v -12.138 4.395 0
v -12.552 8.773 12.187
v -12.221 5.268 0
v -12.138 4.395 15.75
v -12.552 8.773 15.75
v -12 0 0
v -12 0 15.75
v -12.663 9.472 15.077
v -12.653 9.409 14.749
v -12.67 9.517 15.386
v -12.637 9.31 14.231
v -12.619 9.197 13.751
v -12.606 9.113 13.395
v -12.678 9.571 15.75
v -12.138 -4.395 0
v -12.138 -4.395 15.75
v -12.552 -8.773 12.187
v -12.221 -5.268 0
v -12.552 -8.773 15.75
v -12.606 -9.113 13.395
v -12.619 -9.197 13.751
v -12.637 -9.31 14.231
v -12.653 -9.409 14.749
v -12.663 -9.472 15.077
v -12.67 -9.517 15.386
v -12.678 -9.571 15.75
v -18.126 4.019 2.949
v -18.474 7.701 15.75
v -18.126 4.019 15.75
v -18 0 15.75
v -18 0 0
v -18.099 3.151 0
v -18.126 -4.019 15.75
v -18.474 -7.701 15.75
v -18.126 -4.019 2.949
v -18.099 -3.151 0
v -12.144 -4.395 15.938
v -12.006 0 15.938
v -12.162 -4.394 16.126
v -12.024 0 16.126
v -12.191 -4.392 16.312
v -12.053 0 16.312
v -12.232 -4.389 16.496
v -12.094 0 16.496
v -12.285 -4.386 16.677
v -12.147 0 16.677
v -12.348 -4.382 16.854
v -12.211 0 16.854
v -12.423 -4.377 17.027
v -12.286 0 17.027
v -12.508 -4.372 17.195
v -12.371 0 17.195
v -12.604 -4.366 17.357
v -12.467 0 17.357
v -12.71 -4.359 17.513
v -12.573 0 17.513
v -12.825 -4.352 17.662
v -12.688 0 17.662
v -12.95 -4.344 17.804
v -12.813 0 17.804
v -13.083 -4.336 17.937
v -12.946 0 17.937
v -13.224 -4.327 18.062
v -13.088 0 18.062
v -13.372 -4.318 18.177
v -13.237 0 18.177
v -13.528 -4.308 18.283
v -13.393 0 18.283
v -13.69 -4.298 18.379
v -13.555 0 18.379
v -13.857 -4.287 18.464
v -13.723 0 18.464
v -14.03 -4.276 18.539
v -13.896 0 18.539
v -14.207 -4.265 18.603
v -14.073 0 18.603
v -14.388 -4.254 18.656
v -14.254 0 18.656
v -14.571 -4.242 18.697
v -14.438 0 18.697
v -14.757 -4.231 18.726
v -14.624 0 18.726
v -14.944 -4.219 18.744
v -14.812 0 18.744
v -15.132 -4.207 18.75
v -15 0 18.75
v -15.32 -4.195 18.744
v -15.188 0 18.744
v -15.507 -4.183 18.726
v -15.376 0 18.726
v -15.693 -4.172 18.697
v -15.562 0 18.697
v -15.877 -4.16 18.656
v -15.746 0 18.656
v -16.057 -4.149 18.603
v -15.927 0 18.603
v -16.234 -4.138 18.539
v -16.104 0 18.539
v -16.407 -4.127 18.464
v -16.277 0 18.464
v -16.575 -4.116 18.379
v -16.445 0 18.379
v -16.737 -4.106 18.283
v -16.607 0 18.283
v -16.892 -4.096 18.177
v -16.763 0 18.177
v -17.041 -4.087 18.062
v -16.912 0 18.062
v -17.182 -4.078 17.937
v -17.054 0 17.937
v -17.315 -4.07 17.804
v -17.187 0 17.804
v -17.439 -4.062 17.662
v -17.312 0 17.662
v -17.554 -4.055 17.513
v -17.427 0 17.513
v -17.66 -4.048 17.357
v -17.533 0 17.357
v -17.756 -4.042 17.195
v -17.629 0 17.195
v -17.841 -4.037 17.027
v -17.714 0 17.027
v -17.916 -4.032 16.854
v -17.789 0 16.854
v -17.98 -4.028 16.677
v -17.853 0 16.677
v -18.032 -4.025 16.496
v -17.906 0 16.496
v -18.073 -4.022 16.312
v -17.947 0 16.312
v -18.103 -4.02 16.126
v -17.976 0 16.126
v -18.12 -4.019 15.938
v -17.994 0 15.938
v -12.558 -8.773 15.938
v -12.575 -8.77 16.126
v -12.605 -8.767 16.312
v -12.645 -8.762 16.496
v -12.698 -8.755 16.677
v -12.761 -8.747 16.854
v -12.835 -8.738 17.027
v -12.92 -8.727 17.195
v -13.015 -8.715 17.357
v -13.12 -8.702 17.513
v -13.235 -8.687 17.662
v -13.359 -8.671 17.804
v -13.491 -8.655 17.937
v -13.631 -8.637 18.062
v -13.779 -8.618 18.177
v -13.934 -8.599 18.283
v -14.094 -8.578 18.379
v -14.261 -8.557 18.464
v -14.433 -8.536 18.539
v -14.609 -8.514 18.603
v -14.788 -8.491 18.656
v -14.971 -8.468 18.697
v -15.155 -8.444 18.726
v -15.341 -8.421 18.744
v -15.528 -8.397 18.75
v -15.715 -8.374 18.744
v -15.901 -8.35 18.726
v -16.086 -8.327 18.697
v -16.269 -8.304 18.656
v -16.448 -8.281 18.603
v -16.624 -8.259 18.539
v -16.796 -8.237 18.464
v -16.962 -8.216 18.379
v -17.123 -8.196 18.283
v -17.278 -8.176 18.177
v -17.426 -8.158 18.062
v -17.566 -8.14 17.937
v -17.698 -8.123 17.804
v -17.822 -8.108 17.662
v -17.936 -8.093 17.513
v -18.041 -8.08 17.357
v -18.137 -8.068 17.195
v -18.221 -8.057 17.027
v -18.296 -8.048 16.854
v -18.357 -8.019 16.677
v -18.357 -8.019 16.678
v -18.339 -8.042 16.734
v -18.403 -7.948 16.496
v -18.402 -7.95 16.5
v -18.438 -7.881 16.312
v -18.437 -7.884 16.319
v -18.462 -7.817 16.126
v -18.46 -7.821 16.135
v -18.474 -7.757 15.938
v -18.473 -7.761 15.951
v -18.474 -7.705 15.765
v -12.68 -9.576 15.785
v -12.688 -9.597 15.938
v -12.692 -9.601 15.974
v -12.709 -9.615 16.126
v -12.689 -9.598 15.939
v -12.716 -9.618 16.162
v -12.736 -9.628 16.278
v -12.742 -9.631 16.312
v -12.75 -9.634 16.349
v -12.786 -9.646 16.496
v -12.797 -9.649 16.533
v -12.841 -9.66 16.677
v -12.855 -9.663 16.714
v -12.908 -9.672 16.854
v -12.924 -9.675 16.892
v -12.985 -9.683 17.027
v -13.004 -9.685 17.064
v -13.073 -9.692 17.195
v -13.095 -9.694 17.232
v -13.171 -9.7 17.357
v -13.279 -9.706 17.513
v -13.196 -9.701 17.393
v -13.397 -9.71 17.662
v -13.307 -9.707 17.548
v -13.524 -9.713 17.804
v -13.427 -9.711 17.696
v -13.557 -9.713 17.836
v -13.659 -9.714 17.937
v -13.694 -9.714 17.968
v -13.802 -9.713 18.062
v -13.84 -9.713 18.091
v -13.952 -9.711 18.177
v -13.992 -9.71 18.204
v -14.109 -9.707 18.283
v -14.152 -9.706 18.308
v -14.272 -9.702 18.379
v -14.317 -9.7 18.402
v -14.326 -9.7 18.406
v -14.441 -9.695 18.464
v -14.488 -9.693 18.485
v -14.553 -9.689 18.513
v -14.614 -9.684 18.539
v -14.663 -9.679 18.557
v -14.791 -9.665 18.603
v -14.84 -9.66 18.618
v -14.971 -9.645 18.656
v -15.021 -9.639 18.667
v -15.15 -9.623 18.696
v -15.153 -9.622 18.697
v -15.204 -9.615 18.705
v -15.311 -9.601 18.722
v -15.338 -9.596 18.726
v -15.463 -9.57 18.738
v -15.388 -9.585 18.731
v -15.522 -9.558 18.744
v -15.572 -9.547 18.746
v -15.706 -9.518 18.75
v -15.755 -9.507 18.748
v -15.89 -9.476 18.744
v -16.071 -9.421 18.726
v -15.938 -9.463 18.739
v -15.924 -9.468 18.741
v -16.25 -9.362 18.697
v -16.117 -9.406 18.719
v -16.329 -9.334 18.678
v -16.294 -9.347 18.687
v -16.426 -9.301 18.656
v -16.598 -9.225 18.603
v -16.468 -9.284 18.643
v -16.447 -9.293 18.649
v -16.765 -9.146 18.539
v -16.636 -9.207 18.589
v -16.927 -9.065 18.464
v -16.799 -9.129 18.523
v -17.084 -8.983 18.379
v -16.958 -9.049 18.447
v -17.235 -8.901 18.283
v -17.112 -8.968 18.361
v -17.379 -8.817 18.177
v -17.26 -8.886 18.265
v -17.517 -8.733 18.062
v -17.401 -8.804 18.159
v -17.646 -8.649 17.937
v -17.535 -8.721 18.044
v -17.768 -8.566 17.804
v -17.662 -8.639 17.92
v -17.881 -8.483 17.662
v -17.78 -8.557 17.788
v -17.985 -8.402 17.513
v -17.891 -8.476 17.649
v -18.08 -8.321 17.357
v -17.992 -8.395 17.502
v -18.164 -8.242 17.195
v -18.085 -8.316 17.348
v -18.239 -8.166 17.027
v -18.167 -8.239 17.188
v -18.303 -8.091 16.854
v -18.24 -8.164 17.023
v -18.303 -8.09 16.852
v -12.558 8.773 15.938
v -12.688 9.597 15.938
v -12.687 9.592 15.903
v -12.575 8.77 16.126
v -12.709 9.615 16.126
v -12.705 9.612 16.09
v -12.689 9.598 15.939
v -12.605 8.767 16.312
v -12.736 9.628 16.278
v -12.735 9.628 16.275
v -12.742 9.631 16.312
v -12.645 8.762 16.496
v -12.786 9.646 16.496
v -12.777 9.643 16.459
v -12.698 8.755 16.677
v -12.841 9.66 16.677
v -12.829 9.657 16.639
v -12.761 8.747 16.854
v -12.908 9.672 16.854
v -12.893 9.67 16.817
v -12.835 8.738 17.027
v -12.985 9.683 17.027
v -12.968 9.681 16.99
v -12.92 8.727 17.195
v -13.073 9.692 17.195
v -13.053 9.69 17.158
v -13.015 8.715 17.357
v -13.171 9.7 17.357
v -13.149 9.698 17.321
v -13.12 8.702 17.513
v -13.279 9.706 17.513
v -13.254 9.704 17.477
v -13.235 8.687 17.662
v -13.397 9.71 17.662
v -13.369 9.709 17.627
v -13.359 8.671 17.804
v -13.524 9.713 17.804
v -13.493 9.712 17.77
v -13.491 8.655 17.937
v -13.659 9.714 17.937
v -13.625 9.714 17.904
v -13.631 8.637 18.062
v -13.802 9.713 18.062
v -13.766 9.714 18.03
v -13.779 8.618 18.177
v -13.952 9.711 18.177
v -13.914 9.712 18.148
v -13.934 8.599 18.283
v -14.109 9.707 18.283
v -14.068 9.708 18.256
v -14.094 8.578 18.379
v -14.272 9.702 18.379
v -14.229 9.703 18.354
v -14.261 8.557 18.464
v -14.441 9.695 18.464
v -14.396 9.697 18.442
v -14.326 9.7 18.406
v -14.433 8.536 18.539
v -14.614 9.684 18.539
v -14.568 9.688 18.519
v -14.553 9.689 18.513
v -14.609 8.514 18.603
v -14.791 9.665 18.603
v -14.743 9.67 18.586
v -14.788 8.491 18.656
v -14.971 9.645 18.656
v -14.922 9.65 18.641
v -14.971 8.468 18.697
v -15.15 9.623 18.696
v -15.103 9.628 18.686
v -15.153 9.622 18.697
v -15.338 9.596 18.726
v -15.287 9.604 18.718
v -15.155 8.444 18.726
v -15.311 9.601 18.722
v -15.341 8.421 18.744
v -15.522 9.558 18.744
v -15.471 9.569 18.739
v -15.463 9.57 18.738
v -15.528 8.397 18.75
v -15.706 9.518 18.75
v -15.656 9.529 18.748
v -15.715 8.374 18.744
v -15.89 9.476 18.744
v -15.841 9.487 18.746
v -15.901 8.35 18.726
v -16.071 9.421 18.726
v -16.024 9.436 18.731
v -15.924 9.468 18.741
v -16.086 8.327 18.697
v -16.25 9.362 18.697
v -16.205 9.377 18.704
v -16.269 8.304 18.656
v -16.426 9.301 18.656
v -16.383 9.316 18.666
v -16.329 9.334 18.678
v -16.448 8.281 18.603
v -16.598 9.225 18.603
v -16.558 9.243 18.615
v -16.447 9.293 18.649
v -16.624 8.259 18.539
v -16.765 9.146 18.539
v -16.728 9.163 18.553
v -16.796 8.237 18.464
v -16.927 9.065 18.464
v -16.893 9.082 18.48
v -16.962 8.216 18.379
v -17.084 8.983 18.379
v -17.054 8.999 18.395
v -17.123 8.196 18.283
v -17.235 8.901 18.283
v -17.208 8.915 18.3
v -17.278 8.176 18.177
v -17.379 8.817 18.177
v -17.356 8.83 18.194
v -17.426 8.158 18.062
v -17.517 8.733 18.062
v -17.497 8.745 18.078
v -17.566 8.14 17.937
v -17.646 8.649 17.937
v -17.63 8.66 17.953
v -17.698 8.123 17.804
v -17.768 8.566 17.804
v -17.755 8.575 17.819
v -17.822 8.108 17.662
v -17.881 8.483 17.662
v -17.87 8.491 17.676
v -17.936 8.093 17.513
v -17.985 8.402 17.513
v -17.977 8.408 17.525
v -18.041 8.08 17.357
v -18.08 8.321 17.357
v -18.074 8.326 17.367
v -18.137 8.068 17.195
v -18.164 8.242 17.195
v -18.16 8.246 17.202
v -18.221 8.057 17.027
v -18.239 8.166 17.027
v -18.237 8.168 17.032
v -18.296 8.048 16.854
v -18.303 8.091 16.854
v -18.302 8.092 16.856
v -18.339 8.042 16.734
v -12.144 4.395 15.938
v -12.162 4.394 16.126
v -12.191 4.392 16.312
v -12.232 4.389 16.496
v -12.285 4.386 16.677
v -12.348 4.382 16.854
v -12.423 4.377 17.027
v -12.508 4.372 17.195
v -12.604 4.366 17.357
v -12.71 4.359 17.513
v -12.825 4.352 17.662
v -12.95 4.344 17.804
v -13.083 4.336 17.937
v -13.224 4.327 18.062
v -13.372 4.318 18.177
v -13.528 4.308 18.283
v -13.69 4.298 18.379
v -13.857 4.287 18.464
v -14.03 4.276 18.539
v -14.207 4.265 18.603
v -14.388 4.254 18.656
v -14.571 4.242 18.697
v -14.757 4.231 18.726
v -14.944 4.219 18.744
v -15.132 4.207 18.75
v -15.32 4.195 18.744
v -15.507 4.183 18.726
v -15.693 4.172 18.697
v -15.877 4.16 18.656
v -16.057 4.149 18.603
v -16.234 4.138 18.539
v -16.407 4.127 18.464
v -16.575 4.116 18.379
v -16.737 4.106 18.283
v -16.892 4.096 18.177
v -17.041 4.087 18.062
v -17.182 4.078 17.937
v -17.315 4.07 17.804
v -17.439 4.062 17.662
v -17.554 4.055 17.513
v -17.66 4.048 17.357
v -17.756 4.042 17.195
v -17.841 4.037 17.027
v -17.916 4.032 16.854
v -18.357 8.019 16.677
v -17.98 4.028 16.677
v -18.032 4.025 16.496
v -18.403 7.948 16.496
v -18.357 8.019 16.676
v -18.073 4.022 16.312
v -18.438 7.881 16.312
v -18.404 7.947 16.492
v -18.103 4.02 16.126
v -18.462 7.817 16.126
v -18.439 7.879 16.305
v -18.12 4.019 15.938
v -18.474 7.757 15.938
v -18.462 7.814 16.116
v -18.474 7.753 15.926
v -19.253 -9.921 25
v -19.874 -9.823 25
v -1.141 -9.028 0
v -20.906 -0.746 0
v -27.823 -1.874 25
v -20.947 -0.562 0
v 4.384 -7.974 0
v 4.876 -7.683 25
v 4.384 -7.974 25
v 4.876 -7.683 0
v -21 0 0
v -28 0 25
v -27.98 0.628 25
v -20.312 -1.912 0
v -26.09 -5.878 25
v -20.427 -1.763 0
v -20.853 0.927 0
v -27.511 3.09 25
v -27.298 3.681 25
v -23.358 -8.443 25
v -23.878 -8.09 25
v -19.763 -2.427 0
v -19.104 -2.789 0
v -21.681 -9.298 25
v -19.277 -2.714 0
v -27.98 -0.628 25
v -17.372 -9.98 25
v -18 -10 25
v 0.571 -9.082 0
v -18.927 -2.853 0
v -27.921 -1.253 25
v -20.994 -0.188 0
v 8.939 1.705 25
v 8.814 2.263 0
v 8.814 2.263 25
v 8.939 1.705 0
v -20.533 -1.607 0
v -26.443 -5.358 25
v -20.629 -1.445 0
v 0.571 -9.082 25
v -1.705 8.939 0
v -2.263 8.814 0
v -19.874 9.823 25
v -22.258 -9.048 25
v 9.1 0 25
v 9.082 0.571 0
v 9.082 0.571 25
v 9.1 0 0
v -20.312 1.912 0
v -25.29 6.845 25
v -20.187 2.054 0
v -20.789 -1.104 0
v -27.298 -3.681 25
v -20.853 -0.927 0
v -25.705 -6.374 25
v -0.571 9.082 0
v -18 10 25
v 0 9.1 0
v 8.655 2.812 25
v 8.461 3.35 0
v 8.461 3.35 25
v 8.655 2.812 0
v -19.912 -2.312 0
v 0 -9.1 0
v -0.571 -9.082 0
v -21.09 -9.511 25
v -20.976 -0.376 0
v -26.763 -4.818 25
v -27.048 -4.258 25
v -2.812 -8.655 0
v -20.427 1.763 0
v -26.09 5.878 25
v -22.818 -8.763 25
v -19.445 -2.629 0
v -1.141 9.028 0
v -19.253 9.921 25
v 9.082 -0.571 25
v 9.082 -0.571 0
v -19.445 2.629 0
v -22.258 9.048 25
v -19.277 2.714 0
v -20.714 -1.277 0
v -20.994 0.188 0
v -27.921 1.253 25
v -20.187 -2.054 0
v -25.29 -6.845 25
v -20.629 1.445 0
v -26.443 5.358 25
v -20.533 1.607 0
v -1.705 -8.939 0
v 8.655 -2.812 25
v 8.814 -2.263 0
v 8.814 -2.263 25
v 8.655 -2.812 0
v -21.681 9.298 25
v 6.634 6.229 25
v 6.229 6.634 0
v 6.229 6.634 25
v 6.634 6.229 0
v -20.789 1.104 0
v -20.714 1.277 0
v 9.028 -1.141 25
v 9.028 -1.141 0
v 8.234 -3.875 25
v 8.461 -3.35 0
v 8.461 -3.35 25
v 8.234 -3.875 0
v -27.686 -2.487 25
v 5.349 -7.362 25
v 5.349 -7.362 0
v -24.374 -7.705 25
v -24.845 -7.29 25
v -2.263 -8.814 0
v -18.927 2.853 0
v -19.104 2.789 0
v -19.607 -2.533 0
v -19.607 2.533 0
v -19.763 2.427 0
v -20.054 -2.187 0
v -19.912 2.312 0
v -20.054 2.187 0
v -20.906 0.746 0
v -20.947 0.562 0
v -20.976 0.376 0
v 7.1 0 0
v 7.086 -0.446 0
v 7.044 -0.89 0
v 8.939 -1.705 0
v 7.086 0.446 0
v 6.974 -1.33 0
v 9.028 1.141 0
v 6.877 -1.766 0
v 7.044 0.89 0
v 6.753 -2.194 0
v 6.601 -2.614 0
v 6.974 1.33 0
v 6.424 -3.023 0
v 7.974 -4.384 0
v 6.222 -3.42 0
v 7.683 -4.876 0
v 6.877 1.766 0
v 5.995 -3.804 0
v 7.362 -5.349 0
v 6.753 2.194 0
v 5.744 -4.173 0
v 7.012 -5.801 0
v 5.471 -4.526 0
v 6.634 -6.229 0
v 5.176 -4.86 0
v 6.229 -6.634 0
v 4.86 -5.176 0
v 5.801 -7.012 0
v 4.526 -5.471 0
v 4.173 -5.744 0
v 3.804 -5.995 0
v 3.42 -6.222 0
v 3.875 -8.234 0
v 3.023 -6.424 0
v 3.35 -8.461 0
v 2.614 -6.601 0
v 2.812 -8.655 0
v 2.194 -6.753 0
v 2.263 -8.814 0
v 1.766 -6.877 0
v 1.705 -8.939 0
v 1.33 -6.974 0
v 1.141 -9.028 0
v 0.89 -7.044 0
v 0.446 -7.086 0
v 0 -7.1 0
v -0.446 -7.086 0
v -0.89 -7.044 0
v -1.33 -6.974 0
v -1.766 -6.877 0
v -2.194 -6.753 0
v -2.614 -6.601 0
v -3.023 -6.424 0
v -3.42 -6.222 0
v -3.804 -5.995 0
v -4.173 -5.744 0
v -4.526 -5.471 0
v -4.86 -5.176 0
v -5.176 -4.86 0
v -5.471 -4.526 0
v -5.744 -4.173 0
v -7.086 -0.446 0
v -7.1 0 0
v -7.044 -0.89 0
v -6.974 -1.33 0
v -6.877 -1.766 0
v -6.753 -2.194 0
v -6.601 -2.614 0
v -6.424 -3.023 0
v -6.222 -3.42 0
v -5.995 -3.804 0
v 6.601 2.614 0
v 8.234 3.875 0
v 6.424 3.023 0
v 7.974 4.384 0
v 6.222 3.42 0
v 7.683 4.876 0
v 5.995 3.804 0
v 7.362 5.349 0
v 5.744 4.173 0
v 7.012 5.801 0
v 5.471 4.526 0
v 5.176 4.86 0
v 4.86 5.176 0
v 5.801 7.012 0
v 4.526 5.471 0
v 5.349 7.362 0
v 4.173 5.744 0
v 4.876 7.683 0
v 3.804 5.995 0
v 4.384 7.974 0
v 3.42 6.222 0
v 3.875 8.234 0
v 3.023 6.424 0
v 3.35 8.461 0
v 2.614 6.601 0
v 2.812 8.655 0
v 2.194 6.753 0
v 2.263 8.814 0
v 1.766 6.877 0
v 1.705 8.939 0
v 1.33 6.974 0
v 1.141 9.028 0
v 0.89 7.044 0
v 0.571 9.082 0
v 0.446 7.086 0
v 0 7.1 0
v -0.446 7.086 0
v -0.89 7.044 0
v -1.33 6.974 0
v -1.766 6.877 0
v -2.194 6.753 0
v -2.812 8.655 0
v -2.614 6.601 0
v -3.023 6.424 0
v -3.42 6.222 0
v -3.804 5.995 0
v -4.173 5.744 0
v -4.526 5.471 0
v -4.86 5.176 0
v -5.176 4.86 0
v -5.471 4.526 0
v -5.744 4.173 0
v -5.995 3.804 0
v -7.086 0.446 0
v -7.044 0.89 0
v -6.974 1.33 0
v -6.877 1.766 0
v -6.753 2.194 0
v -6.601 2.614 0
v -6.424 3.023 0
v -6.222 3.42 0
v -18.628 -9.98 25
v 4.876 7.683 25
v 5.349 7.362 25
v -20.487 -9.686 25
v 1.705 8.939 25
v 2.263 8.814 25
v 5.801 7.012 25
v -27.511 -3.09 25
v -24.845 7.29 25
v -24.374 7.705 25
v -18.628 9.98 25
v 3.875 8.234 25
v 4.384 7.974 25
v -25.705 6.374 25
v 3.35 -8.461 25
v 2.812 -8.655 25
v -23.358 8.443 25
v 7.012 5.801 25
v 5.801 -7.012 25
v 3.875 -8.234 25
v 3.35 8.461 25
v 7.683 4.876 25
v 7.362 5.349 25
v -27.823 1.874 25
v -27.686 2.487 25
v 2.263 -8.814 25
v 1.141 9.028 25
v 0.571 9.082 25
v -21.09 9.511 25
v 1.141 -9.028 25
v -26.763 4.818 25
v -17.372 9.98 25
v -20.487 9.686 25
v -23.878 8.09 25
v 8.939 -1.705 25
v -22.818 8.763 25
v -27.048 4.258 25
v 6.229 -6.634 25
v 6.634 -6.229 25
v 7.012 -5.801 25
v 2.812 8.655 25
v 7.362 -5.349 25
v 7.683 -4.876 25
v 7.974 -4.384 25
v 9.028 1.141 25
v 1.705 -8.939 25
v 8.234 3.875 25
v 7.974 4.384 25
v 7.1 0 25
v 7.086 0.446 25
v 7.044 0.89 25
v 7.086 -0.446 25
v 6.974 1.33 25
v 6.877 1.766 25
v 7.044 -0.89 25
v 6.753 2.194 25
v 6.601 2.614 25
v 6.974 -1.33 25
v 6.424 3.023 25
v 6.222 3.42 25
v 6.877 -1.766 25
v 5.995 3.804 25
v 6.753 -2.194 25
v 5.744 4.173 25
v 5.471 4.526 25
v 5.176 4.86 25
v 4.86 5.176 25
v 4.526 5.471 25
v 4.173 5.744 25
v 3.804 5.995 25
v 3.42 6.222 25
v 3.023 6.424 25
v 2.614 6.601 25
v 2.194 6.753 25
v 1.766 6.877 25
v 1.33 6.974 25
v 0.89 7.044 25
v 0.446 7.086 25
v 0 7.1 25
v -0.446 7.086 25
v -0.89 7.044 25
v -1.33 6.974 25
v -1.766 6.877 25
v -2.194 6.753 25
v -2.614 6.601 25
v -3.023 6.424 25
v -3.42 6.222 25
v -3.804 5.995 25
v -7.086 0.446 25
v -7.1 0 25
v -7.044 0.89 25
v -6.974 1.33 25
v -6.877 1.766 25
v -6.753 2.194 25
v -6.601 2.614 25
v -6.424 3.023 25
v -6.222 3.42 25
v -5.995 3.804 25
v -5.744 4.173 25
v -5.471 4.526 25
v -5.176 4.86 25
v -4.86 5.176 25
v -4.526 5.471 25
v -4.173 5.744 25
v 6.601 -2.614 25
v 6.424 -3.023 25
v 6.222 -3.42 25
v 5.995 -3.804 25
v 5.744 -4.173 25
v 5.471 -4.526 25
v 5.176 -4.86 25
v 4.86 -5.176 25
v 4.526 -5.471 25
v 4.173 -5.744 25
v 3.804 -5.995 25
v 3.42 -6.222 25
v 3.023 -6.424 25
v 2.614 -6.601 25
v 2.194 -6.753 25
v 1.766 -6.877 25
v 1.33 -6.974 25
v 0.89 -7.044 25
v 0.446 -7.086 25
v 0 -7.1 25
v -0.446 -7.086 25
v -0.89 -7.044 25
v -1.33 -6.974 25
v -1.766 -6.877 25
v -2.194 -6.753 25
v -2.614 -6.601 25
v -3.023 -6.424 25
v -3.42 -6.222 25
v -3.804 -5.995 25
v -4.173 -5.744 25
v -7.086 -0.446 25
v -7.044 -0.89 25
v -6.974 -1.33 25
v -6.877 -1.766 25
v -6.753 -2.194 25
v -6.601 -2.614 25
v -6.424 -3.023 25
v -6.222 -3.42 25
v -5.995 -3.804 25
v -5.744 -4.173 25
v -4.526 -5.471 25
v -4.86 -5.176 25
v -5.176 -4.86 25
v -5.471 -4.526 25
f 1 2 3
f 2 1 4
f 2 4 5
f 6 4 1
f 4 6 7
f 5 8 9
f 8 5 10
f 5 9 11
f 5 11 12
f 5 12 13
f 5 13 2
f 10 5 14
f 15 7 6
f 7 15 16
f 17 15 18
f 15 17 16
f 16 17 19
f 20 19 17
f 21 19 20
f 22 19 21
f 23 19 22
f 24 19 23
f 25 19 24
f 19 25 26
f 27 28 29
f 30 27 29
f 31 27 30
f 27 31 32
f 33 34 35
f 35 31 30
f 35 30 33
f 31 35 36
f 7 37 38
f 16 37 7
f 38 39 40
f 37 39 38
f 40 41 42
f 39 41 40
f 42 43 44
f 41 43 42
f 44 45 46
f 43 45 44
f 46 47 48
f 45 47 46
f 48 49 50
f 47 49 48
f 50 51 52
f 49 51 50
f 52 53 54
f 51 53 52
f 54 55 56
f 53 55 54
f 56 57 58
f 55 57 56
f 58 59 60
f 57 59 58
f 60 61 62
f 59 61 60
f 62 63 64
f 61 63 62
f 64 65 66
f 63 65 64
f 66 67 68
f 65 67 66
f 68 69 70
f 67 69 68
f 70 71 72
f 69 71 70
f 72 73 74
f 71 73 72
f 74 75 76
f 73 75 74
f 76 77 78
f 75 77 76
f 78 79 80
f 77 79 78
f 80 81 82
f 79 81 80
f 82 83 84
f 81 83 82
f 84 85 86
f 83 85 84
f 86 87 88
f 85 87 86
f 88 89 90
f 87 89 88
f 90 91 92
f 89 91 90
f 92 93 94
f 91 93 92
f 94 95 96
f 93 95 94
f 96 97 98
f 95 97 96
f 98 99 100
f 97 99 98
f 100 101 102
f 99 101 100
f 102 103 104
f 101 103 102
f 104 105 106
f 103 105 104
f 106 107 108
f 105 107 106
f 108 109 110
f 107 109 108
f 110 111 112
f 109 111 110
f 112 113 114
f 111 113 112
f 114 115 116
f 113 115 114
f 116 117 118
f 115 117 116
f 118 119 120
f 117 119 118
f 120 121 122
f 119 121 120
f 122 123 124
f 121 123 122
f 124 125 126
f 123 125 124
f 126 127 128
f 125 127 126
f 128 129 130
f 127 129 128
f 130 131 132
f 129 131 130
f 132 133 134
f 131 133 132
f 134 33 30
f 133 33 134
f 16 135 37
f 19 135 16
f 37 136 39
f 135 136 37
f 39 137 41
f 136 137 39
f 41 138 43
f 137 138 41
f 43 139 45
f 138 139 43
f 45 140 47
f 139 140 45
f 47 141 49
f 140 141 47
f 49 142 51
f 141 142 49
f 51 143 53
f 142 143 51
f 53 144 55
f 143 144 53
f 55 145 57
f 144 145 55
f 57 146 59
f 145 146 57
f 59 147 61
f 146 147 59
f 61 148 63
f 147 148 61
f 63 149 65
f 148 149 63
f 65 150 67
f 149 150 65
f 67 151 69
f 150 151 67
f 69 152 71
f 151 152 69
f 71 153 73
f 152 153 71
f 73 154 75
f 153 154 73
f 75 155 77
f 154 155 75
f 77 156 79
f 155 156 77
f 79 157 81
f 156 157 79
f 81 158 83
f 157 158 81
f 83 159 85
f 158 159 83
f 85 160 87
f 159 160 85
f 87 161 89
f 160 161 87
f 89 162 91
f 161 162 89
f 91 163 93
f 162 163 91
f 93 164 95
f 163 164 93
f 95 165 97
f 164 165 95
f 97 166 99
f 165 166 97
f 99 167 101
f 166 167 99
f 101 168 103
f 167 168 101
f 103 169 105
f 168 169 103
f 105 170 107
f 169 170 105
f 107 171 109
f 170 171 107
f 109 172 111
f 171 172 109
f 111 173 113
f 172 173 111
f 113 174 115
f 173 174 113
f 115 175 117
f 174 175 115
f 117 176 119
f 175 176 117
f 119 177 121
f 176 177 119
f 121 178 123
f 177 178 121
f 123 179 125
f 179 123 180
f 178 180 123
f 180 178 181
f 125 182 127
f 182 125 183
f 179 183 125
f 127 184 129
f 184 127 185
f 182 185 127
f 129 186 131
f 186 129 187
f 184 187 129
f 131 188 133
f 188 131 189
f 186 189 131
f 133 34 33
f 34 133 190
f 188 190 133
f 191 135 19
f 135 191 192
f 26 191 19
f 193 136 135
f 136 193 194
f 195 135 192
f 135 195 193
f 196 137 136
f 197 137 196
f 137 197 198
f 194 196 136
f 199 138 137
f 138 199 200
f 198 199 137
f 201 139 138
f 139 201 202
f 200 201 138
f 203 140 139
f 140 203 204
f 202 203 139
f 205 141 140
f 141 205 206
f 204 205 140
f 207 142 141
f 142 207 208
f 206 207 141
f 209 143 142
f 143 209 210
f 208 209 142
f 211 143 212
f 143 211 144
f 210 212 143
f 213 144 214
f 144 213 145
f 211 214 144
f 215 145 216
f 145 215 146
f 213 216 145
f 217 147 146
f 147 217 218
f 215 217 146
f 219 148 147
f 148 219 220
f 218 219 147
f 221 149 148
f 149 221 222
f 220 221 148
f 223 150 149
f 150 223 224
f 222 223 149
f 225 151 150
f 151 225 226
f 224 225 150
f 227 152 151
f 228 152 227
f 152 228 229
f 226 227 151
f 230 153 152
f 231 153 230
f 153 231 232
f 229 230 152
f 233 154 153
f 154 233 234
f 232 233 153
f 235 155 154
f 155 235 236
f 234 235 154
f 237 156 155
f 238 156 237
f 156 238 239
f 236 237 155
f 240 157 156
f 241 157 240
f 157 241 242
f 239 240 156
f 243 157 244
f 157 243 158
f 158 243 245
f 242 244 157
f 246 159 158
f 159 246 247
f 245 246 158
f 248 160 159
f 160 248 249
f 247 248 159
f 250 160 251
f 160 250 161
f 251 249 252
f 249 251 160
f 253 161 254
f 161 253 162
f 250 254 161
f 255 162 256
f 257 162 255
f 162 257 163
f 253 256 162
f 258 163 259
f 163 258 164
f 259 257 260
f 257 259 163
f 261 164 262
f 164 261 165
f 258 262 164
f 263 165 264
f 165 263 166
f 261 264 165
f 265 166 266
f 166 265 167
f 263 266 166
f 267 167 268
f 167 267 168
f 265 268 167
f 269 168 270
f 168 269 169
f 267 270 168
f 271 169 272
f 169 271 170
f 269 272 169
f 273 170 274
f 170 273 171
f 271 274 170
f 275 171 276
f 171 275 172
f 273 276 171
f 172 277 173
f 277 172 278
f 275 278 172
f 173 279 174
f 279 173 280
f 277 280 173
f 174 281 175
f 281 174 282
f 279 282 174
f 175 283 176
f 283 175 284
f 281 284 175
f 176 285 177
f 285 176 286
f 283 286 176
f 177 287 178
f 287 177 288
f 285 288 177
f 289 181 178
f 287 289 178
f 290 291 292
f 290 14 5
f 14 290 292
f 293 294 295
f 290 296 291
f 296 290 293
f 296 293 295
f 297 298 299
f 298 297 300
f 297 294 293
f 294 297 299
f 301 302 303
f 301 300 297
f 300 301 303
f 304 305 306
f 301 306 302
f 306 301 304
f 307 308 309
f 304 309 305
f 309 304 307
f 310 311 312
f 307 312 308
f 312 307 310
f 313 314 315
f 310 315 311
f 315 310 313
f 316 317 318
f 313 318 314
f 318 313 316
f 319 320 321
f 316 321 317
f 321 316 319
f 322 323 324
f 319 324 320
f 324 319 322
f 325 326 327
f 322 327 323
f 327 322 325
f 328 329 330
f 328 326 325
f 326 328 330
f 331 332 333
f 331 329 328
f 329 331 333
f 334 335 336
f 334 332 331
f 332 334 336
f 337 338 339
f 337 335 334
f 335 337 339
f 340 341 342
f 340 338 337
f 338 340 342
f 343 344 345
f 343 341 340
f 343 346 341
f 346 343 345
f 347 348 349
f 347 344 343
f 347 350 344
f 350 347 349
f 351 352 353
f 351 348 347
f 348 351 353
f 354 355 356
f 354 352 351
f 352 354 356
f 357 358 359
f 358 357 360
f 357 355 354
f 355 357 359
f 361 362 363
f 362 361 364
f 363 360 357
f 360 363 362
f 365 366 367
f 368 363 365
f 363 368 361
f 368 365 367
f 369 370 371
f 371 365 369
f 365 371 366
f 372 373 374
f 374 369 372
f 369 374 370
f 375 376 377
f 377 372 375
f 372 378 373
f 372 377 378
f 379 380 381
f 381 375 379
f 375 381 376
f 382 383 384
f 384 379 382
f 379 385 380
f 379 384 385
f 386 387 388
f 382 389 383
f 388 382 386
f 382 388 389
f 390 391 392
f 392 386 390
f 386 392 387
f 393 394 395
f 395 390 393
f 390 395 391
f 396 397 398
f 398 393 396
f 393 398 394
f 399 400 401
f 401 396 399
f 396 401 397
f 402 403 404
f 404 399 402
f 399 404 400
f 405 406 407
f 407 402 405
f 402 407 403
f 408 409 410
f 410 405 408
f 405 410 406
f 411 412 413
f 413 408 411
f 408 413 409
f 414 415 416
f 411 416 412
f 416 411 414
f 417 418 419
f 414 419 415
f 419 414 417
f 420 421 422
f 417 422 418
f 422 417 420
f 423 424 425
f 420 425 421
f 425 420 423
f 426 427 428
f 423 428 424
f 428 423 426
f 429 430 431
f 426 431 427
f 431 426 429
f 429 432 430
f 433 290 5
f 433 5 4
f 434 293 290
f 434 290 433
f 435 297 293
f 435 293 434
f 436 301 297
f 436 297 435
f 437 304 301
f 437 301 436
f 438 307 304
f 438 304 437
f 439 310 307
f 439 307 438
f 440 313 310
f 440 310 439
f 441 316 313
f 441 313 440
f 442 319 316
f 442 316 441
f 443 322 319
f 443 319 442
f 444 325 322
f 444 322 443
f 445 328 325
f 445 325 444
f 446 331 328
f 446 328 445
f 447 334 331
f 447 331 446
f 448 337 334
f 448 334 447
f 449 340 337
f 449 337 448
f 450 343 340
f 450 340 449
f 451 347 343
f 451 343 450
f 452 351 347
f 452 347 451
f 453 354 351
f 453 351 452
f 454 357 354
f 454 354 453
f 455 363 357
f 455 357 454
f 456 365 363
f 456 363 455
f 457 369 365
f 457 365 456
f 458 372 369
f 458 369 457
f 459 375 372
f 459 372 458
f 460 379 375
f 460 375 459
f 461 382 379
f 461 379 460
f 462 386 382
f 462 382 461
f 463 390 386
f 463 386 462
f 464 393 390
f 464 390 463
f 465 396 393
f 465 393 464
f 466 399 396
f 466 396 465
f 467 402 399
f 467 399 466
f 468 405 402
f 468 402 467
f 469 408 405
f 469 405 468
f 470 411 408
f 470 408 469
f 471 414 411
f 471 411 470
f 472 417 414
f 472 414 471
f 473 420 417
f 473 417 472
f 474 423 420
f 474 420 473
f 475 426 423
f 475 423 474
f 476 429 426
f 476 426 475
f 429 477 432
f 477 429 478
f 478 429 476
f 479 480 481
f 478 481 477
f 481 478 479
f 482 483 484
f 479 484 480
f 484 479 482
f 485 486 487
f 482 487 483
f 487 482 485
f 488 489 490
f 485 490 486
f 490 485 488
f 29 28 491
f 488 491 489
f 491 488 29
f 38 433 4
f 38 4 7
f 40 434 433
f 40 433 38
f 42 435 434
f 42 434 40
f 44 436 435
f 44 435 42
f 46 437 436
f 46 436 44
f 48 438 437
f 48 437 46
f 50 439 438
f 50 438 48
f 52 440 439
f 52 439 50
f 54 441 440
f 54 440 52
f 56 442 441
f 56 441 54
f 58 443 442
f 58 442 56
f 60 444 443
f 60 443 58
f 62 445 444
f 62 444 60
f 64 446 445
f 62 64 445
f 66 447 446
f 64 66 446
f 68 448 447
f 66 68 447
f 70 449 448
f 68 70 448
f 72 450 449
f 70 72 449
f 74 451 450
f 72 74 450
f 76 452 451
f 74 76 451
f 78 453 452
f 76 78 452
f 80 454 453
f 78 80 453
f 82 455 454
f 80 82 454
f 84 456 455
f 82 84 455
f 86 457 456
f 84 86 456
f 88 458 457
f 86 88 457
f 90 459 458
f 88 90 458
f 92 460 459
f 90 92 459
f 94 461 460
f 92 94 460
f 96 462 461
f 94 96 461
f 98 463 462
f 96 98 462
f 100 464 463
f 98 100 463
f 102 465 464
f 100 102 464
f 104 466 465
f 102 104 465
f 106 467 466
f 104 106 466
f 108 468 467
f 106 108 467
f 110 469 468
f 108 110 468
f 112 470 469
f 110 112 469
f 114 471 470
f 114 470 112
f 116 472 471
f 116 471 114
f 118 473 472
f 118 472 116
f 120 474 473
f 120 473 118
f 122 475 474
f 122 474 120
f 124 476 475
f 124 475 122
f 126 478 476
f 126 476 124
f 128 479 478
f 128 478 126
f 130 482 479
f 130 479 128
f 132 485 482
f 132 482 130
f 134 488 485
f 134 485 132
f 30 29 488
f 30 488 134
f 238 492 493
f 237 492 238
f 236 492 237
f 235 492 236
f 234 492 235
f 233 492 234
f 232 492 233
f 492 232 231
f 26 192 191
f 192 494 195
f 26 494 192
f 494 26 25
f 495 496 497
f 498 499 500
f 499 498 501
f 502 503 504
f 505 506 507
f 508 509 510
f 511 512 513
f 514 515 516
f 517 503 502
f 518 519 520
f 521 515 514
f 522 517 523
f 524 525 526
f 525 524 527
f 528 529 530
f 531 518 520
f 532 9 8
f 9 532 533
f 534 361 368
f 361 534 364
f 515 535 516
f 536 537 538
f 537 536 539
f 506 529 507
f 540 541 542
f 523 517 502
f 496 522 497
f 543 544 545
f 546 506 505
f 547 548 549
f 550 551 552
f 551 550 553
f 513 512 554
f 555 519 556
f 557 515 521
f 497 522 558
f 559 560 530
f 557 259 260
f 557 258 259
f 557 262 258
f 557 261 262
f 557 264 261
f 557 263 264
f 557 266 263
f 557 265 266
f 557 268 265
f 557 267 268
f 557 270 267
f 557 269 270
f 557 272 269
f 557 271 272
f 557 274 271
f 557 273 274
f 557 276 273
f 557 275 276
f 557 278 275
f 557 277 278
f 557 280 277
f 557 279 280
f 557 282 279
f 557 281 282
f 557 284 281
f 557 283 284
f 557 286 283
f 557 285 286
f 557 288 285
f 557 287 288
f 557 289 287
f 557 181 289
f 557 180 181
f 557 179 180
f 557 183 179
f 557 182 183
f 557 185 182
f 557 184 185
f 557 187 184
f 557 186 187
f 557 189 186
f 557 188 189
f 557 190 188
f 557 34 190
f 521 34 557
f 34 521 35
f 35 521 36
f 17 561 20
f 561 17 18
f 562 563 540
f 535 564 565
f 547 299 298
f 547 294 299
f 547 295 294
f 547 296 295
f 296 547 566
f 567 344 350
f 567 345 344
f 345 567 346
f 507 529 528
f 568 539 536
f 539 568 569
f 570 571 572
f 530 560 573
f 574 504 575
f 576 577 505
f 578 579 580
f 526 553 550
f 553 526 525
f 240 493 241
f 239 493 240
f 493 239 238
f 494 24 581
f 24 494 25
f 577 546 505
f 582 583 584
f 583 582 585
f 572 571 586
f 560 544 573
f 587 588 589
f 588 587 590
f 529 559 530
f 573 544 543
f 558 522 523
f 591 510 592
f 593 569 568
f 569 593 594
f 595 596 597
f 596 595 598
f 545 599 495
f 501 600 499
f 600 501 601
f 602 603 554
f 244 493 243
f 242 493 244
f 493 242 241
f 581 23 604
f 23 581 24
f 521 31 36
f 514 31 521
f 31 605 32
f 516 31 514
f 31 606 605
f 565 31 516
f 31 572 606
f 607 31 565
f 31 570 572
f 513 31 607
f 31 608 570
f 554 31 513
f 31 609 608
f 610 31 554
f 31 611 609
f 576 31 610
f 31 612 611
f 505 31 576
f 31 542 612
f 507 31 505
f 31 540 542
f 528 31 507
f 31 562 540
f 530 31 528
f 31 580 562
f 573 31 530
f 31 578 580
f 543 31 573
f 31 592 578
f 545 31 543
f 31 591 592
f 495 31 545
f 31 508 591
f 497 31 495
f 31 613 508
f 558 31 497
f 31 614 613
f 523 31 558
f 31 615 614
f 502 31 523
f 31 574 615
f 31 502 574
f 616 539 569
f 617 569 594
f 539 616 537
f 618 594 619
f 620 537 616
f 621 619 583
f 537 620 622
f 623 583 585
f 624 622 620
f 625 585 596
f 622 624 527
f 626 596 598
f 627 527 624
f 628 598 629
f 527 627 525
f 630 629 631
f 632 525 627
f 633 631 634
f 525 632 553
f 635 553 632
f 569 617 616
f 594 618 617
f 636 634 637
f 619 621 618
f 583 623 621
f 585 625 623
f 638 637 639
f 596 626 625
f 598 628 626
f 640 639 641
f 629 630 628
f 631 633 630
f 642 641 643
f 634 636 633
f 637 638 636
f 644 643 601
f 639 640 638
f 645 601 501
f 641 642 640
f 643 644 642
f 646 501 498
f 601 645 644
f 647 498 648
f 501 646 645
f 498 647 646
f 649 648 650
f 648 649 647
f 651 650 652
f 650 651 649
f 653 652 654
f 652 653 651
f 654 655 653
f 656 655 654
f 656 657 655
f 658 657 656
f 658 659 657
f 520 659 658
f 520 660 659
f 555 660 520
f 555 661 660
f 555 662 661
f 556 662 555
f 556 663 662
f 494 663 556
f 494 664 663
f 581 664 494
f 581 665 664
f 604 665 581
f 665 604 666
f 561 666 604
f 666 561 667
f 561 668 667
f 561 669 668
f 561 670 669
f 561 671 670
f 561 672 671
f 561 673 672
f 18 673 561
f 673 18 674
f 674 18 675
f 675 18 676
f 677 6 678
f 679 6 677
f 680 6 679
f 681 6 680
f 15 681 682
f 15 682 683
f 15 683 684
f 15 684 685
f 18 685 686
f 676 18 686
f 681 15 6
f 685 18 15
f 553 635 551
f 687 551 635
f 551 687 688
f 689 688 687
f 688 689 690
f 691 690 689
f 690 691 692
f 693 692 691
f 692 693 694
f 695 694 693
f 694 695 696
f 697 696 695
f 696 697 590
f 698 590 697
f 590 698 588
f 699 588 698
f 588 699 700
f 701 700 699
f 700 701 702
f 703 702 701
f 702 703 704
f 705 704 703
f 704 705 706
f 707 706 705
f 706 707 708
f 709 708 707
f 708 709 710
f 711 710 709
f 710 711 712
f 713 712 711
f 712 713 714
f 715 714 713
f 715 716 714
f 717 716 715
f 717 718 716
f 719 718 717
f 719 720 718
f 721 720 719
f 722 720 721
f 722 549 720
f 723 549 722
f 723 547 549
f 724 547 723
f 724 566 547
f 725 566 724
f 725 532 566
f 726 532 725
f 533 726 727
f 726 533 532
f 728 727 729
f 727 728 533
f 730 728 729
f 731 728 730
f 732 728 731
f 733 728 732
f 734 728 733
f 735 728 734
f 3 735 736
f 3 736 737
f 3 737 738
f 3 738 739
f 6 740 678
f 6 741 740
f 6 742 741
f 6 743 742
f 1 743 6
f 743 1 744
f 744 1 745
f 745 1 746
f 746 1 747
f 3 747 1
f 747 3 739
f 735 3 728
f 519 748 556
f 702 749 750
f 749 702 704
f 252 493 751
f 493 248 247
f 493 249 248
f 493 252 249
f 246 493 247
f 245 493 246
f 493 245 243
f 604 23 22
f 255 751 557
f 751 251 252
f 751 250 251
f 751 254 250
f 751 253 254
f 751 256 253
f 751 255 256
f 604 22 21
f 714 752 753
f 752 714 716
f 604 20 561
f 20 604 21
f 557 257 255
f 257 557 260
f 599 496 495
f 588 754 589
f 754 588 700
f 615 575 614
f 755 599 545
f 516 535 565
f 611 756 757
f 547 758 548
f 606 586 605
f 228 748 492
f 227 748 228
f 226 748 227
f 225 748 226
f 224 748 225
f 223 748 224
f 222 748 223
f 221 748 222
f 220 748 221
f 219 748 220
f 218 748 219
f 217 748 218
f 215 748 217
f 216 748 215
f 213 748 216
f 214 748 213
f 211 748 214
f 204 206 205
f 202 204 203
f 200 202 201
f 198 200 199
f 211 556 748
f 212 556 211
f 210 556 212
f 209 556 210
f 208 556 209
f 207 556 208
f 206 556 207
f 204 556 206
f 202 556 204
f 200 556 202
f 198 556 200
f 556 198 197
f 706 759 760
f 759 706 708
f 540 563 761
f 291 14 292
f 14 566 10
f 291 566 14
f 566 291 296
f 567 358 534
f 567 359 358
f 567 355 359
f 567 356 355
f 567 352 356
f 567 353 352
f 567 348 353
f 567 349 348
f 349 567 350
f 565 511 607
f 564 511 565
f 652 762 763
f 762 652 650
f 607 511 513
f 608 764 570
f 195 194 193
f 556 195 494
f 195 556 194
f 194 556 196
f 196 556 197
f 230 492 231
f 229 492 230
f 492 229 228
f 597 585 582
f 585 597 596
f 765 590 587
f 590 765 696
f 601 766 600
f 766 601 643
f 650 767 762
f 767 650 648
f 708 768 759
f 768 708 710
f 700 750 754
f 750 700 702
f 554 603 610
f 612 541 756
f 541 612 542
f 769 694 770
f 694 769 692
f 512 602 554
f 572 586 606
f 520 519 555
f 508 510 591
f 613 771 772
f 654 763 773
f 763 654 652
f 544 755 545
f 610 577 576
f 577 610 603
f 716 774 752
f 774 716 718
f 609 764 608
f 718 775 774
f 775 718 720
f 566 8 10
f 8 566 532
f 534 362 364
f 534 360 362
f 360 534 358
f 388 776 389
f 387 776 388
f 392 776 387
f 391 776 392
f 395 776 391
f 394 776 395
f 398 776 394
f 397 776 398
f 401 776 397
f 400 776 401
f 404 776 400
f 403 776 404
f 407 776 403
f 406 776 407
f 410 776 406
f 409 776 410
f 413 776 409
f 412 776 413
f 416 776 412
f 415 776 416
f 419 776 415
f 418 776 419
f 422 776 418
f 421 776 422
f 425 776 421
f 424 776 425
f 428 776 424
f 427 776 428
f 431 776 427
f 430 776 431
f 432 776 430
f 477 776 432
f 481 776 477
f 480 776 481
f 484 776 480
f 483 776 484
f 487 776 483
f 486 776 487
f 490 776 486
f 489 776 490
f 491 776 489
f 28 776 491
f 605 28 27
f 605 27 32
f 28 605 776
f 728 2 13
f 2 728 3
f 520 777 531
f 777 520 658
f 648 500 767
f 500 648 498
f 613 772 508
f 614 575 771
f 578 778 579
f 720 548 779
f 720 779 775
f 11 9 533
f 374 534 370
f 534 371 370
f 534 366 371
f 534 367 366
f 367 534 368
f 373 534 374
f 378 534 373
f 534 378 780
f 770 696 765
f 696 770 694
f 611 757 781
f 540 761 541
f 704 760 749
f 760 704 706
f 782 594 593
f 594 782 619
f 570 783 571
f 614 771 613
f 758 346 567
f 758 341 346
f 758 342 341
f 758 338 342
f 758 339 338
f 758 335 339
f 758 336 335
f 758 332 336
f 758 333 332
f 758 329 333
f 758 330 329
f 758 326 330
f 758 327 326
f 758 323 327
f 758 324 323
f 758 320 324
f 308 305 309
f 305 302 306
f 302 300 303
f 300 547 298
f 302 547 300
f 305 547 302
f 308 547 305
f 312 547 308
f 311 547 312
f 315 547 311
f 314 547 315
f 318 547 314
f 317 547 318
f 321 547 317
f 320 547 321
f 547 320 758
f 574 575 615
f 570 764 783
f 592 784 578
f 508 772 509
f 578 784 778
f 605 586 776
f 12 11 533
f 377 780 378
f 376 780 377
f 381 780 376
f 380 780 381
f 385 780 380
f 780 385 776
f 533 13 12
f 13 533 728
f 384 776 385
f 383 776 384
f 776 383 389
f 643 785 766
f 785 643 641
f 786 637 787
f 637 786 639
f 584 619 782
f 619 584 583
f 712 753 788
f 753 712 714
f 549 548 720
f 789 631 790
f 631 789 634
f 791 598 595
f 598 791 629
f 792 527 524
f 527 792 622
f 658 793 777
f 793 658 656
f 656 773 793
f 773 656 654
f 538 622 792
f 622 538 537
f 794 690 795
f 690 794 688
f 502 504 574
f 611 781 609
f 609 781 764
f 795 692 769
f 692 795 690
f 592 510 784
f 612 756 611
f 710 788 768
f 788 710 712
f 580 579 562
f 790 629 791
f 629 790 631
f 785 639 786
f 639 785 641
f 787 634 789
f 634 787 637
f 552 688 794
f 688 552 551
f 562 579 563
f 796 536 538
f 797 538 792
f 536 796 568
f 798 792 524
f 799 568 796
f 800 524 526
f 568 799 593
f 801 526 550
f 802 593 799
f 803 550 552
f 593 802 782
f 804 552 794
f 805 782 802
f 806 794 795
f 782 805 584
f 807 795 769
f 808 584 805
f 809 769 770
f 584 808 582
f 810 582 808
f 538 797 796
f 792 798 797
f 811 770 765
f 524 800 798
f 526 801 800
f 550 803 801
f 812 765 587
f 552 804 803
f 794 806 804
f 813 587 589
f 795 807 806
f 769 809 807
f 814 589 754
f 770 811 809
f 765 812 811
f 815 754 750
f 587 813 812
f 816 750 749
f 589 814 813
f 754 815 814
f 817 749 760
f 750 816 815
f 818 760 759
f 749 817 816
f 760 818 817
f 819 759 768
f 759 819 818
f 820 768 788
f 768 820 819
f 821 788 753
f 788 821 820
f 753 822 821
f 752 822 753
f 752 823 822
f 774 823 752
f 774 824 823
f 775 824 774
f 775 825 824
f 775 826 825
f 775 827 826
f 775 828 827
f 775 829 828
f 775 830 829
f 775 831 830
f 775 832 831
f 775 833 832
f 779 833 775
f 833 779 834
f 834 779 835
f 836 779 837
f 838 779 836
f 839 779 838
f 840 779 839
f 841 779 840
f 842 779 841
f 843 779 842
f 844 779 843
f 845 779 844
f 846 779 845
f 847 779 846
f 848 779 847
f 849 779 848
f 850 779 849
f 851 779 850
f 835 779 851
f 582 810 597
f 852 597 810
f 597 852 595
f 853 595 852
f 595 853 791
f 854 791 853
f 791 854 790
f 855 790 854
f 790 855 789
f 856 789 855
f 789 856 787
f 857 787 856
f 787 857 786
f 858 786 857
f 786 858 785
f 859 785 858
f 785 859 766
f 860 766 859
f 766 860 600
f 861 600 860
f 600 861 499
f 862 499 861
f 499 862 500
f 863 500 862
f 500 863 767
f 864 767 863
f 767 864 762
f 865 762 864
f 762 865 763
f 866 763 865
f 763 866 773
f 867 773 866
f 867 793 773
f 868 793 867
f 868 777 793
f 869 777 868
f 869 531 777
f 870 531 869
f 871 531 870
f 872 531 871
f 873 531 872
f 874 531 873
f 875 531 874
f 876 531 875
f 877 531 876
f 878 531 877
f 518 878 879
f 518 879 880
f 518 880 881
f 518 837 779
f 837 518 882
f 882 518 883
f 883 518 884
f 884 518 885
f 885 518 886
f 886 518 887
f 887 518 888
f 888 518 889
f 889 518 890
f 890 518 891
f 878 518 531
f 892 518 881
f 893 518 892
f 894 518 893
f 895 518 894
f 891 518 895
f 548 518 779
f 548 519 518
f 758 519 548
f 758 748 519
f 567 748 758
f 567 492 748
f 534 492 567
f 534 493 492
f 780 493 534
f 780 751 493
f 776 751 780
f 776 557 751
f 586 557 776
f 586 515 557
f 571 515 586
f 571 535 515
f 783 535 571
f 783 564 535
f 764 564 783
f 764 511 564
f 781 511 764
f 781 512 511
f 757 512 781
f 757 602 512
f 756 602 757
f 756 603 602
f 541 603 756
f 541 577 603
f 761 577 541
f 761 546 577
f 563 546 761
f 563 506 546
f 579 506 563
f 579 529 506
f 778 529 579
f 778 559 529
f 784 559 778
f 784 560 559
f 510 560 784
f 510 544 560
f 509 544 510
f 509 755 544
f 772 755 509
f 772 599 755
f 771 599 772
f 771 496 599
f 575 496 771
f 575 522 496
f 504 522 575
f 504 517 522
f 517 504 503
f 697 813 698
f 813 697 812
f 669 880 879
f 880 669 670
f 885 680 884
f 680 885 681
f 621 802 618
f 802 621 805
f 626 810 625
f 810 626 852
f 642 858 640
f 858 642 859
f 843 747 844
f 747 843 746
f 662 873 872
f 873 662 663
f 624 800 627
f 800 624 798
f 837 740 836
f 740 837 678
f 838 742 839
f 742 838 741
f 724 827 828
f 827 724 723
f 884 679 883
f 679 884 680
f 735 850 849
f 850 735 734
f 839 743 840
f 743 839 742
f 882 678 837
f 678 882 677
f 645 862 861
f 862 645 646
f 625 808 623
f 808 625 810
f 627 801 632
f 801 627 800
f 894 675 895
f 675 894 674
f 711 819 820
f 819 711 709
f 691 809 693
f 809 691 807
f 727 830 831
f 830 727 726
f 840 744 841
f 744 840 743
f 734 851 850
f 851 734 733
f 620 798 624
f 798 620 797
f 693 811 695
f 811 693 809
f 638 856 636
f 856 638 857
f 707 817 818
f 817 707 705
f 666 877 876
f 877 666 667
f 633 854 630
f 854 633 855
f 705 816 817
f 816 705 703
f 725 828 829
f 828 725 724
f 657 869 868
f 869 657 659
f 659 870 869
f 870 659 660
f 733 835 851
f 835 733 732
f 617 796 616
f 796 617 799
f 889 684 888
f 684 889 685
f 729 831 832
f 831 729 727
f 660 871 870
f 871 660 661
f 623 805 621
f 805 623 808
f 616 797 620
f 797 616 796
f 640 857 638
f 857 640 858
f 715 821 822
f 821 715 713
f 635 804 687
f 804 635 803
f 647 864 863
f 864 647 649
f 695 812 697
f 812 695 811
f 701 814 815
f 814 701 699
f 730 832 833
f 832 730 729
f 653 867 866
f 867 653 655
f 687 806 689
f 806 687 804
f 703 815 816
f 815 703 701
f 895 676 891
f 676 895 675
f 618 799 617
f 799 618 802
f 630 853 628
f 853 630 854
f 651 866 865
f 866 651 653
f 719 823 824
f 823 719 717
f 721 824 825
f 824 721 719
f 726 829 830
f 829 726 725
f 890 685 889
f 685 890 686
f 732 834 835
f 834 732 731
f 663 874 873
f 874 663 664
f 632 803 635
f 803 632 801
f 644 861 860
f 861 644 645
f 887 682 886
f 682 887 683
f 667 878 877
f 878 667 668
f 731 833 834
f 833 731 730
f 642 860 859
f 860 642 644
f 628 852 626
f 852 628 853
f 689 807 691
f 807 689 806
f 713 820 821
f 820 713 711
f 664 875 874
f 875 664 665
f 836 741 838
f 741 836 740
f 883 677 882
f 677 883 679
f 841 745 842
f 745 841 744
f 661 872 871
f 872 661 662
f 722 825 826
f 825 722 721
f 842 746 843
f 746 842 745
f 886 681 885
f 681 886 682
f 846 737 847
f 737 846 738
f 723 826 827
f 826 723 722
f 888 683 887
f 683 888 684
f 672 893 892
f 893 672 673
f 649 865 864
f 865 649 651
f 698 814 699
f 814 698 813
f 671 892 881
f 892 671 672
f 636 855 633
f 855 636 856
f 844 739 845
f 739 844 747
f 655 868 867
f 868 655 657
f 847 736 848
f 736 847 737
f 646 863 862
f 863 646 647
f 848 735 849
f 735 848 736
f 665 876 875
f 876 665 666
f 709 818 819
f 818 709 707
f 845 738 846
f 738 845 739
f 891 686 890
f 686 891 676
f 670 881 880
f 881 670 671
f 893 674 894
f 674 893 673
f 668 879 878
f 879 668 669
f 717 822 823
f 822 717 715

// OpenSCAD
HOLE_DIA = 14.2;

WALL_THICKNESS = 2;
POT_WALL_THICKNESS = 6;
POT_DIA = 140;

WIDTH = 20;
HEIGHT = 25;

$fn = 100;

module hole() {
    cylinder(d = HOLE_DIA, h = HEIGHT * 2, center = true);
}

module pot() {
    translate([0, 0, HEIGHT - POT_WALL_THICKNESS/2])
    rotate_extrude(angle = 360)
    translate([-(POT_DIA-POT_WALL_THICKNESS)/2, 0, 0])
    circle(d = POT_WALL_THICKNESS);

    difference() {
        cylinder(d = POT_DIA, h = HEIGHT - POT_WALL_THICKNESS/2);
        cylinder(d = POT_DIA - 2 * POT_WALL_THICKNESS, h = HEIGHT - POT_WALL_THICKNESS/2);
    }
}

module adapter() {
    difference() {
        hull() {
            cylinder(d = HOLE_DIA + 2 * WALL_THICKNESS, h = HEIGHT);
            translate([-(WIDTH - WALL_THICKNESS), 0, 0])
            cylinder(d1 = POT_WALL_THICKNESS, d2 = WIDTH, h = HEIGHT);
        }

        #translate([-POT_DIA/2 -WIDTH/2 -WALL_THICKNESS, 0, -HEIGHT/4])
        pot();

        #hole();
    }
}

adapter();
